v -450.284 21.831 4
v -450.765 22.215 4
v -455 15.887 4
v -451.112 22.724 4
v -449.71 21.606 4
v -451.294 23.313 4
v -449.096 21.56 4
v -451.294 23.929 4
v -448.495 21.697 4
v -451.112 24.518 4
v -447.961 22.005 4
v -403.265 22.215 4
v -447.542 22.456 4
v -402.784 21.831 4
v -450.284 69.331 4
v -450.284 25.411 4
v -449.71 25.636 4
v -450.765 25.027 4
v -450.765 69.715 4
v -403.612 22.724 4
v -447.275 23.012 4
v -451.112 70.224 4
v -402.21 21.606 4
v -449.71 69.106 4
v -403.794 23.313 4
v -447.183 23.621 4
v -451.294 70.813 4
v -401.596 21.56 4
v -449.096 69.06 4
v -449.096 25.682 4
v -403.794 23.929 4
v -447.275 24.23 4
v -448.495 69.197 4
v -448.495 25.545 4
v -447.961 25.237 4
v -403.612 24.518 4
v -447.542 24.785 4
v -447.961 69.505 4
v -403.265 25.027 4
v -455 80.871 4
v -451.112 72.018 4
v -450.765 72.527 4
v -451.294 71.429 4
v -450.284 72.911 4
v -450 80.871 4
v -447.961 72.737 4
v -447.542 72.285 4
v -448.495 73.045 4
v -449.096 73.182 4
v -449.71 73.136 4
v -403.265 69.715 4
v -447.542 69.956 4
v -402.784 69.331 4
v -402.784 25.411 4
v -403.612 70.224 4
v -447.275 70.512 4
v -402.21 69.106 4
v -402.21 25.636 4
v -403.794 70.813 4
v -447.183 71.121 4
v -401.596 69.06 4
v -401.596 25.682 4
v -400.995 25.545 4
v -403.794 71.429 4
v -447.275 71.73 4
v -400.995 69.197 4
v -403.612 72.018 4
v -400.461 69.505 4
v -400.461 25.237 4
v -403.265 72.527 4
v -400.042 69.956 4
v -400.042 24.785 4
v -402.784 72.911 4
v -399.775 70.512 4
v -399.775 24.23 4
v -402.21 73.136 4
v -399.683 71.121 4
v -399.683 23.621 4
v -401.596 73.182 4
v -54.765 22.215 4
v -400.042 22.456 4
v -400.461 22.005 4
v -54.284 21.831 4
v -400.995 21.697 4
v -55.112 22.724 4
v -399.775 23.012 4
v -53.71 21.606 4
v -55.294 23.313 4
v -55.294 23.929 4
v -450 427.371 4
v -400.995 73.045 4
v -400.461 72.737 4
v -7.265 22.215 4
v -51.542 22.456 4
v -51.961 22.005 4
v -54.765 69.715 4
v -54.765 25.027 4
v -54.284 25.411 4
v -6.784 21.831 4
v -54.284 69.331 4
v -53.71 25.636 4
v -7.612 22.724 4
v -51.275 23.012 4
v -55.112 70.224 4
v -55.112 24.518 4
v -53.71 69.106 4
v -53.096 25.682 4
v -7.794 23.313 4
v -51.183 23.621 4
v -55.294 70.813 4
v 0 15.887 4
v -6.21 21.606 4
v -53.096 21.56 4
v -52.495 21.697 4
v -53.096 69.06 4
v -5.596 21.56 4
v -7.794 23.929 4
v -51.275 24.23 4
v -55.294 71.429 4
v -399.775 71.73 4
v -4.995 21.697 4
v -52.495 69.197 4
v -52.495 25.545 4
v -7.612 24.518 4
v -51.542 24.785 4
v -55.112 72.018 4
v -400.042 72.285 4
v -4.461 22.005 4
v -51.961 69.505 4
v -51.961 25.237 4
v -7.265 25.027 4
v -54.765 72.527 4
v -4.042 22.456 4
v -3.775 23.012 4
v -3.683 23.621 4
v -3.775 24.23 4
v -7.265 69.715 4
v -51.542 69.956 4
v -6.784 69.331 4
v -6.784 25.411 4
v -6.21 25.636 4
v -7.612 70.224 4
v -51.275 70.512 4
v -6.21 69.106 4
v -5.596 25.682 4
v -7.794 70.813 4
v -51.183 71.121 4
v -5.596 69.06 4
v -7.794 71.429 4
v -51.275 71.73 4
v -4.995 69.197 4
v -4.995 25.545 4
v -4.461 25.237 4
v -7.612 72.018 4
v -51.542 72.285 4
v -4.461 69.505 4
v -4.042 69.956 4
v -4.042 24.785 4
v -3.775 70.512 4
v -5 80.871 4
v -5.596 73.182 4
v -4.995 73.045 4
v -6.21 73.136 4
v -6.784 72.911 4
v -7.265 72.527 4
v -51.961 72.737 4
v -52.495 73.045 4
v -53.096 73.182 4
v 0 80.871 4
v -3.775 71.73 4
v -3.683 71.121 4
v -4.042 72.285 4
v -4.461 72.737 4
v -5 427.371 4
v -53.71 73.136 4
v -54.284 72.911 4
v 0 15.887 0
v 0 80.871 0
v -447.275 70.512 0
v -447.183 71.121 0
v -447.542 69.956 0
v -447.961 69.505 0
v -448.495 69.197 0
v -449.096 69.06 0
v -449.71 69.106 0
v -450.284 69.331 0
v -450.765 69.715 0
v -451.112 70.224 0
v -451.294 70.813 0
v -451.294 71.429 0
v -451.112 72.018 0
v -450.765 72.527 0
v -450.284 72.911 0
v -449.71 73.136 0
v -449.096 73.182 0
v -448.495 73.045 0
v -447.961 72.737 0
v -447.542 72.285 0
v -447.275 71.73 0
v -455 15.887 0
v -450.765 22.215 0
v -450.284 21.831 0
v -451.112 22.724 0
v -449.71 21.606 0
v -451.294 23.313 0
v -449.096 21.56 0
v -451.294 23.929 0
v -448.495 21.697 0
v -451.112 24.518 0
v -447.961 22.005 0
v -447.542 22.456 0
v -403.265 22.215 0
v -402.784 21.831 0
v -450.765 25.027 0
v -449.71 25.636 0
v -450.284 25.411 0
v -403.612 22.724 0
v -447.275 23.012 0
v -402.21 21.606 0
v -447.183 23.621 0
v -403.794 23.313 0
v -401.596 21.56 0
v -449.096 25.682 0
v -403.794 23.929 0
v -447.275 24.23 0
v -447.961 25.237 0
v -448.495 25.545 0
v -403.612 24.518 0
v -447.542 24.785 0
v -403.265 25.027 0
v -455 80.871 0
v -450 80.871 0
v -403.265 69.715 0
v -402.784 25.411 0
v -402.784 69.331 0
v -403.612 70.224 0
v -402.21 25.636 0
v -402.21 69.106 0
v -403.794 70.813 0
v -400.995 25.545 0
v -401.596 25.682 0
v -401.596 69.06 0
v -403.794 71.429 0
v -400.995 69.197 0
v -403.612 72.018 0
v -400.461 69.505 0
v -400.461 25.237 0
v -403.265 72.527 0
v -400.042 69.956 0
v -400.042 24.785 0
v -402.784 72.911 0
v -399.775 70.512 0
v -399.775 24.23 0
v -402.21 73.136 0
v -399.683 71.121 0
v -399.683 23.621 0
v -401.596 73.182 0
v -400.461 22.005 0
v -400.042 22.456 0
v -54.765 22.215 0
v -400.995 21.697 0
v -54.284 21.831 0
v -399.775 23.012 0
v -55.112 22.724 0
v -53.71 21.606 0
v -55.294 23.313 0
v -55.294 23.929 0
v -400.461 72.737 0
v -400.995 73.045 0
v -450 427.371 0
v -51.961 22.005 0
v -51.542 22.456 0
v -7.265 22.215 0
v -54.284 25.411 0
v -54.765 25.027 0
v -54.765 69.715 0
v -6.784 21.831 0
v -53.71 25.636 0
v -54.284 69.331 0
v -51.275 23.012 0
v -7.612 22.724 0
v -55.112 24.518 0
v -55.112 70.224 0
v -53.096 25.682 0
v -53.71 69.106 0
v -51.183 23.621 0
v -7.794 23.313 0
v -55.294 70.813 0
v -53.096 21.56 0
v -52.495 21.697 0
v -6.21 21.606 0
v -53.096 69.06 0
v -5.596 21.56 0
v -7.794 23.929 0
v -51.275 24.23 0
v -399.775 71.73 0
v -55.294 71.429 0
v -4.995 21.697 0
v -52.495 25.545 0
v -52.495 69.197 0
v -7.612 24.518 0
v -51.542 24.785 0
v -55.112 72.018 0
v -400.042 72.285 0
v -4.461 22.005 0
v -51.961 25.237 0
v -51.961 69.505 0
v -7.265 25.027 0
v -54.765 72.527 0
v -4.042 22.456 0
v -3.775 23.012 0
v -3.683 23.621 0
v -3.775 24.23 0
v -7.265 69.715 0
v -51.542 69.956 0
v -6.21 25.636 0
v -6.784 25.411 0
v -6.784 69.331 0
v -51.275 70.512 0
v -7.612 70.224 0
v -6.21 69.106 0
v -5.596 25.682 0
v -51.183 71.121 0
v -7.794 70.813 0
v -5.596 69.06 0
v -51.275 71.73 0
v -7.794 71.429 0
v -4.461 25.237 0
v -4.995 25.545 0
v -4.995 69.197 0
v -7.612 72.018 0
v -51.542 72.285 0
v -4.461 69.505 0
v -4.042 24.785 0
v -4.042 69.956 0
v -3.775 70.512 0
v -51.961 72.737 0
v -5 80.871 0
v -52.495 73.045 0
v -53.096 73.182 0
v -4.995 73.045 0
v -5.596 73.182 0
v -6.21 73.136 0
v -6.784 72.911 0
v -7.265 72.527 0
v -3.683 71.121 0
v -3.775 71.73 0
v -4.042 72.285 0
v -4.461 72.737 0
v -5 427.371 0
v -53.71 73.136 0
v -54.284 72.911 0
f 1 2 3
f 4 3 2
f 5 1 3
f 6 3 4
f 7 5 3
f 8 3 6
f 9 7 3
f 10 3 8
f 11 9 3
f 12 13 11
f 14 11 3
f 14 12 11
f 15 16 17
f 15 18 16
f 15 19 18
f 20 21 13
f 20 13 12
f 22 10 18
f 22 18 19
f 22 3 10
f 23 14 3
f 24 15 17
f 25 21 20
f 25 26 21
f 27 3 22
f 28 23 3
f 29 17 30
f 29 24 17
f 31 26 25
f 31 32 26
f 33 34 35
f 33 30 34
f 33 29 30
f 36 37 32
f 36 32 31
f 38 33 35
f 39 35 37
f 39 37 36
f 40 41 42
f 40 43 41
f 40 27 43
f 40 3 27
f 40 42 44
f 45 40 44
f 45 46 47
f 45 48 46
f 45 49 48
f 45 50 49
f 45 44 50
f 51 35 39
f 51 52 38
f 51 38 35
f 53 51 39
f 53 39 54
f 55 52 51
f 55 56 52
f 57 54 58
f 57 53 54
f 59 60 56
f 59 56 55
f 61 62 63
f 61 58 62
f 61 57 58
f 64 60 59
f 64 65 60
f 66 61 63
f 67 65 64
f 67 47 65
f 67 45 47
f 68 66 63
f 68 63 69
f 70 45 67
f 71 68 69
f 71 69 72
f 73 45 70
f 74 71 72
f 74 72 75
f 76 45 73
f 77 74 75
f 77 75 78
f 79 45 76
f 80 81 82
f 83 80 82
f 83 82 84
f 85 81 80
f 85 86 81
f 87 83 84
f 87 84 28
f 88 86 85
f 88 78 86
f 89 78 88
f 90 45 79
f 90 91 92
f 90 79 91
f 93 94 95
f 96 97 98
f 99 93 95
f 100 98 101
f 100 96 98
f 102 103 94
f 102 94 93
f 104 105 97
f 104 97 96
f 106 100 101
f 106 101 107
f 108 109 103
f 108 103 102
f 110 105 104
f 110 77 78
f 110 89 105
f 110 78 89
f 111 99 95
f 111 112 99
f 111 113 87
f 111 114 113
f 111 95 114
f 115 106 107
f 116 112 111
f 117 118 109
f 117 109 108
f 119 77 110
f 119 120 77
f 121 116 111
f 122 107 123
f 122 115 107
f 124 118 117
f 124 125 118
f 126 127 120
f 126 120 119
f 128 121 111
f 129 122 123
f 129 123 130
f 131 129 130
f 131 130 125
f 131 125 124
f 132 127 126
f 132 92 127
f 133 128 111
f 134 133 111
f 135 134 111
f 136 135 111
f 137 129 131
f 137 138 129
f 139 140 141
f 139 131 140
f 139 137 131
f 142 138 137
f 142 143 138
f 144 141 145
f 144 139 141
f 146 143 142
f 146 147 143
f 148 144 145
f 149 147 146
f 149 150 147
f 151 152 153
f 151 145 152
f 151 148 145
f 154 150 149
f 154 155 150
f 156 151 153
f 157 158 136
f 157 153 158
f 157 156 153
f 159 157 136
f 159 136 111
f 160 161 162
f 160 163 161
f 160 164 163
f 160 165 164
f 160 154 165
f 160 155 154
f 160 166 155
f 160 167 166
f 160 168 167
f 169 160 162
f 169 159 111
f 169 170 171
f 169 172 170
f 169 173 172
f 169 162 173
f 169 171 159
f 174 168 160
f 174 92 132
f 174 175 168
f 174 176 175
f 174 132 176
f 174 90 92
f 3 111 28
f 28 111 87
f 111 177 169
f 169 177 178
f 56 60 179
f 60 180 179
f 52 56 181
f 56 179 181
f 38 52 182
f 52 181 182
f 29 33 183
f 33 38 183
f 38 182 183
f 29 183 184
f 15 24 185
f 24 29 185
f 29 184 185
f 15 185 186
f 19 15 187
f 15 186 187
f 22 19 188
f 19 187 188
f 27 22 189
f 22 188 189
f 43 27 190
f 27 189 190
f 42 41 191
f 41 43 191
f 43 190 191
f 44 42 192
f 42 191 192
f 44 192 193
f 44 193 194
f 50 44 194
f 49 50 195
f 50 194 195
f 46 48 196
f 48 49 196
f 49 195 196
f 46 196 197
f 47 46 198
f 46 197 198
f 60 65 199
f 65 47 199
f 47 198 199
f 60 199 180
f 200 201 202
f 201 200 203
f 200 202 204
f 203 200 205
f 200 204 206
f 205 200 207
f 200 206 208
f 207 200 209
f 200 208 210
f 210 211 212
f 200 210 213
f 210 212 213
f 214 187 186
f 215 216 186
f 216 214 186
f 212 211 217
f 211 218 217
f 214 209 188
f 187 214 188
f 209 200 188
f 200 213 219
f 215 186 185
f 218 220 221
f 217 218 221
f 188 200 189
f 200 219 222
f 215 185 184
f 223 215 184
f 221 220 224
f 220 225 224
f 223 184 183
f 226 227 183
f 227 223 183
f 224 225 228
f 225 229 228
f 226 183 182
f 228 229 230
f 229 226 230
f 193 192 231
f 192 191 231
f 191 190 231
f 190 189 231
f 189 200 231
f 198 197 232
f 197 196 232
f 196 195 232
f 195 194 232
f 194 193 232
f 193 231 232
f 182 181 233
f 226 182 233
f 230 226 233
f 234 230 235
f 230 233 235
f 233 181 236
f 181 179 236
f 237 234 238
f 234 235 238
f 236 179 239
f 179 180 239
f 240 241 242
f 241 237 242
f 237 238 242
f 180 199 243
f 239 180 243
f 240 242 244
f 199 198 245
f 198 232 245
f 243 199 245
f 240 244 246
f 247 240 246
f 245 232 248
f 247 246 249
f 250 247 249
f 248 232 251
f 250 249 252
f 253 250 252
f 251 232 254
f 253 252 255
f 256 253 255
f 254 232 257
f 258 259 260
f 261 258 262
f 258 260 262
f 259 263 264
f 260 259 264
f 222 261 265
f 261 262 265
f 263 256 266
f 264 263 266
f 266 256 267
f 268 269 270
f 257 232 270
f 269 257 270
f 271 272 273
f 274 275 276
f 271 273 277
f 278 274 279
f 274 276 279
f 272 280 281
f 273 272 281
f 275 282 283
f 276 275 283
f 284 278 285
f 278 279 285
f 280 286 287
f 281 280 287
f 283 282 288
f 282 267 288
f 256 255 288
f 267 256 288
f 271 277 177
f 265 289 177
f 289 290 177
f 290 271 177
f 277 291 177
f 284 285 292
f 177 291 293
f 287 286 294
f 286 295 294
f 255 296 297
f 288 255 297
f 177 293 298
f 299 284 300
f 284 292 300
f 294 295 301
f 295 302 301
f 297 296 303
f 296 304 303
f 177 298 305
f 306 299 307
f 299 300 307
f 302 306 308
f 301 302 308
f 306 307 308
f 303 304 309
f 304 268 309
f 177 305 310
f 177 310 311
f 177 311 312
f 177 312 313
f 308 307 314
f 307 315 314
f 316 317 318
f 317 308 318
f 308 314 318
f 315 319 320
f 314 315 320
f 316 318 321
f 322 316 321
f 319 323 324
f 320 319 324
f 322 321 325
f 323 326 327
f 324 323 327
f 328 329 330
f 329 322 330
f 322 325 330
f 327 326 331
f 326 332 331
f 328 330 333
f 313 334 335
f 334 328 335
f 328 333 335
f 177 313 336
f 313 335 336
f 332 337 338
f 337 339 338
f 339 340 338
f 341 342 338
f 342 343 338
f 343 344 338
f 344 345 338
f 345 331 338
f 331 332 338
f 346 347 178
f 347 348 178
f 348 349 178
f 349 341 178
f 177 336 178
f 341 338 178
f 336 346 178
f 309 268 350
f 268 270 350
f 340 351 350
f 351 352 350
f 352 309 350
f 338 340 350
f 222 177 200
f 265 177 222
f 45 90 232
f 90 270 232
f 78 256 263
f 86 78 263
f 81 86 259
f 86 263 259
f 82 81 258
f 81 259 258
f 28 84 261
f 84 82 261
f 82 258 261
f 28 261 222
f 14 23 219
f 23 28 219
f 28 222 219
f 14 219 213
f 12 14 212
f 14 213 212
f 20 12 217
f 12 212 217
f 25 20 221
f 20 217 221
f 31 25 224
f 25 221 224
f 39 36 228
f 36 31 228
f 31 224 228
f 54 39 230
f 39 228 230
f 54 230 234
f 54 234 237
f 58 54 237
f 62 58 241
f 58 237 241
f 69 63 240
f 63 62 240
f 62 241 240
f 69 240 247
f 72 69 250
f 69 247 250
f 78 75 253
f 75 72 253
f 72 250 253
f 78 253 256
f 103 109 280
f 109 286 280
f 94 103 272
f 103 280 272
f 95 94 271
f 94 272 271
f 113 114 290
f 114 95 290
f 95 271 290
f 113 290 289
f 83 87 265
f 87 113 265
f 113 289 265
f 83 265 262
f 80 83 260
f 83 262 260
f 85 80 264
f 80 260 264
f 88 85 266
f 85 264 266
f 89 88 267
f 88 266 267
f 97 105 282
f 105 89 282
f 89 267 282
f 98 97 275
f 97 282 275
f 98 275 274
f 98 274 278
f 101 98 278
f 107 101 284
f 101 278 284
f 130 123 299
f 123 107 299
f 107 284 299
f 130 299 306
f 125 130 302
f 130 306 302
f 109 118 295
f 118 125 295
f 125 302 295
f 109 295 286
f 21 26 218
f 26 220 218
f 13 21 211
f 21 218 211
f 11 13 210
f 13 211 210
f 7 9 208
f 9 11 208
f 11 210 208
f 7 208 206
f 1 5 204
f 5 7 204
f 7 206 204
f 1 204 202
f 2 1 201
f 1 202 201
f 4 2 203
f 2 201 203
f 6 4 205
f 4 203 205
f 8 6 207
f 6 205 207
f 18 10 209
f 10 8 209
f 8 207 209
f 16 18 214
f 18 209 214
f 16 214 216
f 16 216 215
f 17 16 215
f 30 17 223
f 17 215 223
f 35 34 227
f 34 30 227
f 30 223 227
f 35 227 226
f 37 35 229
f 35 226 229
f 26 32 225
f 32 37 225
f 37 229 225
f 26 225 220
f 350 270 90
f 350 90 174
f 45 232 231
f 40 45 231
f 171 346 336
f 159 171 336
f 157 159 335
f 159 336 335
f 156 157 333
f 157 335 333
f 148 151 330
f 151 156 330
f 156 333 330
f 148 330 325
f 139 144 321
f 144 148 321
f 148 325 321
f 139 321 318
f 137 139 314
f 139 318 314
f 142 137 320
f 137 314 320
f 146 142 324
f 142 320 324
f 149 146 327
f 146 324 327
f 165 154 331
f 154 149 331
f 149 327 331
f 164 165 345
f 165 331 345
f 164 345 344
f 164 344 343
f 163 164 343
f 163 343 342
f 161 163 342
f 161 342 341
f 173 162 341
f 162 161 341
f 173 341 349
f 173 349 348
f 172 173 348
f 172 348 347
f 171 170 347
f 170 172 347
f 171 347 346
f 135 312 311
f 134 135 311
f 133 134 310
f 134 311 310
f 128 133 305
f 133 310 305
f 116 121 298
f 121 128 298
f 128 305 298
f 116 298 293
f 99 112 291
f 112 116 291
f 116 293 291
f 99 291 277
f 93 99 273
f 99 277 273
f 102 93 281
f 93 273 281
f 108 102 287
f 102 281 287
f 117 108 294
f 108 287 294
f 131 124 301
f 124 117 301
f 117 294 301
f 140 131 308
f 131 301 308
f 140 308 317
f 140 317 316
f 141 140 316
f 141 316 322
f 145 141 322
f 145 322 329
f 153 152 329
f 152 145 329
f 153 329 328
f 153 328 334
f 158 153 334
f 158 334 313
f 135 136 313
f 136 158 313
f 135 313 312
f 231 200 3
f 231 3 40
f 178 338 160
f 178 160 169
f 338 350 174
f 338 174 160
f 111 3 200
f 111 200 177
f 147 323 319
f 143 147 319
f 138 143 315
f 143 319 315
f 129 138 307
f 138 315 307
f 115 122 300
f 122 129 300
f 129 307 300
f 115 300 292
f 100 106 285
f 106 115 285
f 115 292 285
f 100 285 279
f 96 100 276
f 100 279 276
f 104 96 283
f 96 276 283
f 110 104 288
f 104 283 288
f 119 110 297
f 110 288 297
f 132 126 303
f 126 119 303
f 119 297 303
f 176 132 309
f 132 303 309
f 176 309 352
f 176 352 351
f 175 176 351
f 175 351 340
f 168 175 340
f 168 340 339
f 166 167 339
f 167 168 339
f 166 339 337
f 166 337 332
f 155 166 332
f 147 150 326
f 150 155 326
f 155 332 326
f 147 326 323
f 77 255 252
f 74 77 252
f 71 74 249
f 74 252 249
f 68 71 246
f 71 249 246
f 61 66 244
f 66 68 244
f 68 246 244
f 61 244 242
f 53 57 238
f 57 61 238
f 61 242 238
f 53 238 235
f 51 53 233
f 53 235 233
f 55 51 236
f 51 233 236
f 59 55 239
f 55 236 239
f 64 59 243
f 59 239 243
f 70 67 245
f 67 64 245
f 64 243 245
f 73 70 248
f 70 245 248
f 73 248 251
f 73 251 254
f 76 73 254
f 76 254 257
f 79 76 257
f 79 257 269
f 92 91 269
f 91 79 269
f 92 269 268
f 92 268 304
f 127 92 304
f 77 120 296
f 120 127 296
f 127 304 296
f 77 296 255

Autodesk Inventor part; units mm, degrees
ref_plane "YZ Plane" through (0, 0, 0) normal (1, 0, 0) x (0, 1, 0)
ref_plane "XZ Plane" through (0, 0, 0) normal (0, 1, 0) x (-1, 0, 0)
ref_plane "XY Plane" through (0, 0, 0) normal (0, 0, 1) x (1, 0, 0)
ref_plane "Work Plane1" through (0, 10, 0) normal (0, 0, 1) x (1, 0, 0)
sketch "Sketch1" plane through (0, 10, 0) normal (0, 0, 1) x (1, 0, 0)
  line L0 (-1, 70.8708) -> (-1, -7.0974) projected
  line L1 (-1, 70.8708) -> (-53.0809, 70.8708) projected
  arc A0 (-53.0809, 70.8708) -> (-59.8755, 68.2079) centre (-53.0809, 60.8708) ccw projected
  line L2 (-59.8755, 68.2079) -> (-118.9152, 13.5337) projected
  line L3 (-1, -7.0974) -> (-454, -7.0974) projected
  circle A1 centre (-53.25, 13.6208) radius 2.067 projected
  circle A2 centre (-53.25, 61.1208) radius 2.067 projected
  circle A3 centre (-5.75, 13.6208) radius 2.067 projected
  circle A4 centre (-5.75, 61.1208) radius 2.067 projected
  circle A5 centre (-401.75, 61.1208) radius 2.067 projected
  circle A6 centre (-449.25, 61.1208) radius 2.067 projected
  circle A7 centre (-401.75, 13.6208) radius 2.067 projected
  circle A8 centre (-449.25, 13.6208) radius 2.067 projected
  line L4 (-454, -7.0974) -> (-454, 70.8708) projected
  line L5 (-1, -7.0974) -> (-454, -7.0974) projected
  arc A9 (-344.754, 14.034) -> (-337.4562, 10.8708) centre (-337.4562, 20.8708) ccw projected
  line L6 (-344.754, 14.034) -> (-395.0366, 67.7076) projected
  arc A10 (-395.0366, 67.7076) -> (-402.3345, 70.8708) centre (-402.3345, 60.8708) ccw projected
  line L7 (-402.3345, 70.8708) -> (-454, 70.8708) projected
  arc A11 (-436.1083, -78.4697) -> (-447.5, -37.6782) centre (-447.5, -59.6646) ccw projected
  line L8 (-18.8917, -78.4697) -> (-436.1083, -78.4697) projected
  arc A12 (-7.5, -37.6782) -> (-18.8917, -78.4697) centre (-7.5, -59.6646) ccw projected
  line L9 (-2, -37.6782) -> (-7.5, -37.6782) projected
  arc A13 (-2, -37.6782) -> (-1, -36.6782) centre (-2, -36.6782) ccw projected
  line L10 (-1, -12.4515) -> (-1, -36.6782) projected
  line L11 (-454, -12.4515) -> (-1, -12.4515) projected
  line L12 (-454, -36.6782) -> (-454, -12.4515) projected
  arc A14 (-454, -36.6782) -> (-453, -37.6782) centre (-453, -36.6782) ccw projected
  line L13 (-447.5, -37.6782) -> (-453, -37.6782) projected
  line L14 (-237.5, -48.429) -> (-237.5, -34.9155) projected
  ellipse E0 centre (-235.5, -34.9155) end of major axis (-237.5, -34.9155) minor radius 1.6892 (-235.5, -33.2263) -> (-237.5, -34.9155) ccw projected
  line L15 (-235.5, -33.2263) -> (-219.5, -33.2263) projected
  ellipse E1 centre (-219.5, -34.9155) end of major axis (-221.5, -34.9155) minor radius 1.6892 (-217.5, -34.9155) -> (-219.5, -33.2263) ccw projected
  line L16 (-217.5, -34.9155) -> (-217.5, -48.429) projected
  ellipse E2 centre (-219.5, -48.429) end of major axis (-217.5, -48.429) minor radius 1.6892 (-219.5, -50.1182) -> (-217.5, -48.429) ccw projected
  line L17 (-219.5, -50.1182) -> (-235.5, -50.1182) projected
  ellipse E3 centre (-235.5, -48.429) end of major axis (-233.5, -48.429) minor radius 1.6892 (-237.5, -48.429) -> (-235.5, -50.1182) ccw projected
  line L18 (-267.5, -48.429) -> (-267.5, -34.9155) projected
  ellipse E4 centre (-265.5, -34.9155) end of major axis (-267.5, -34.9155) minor radius 1.6892 (-265.5, -33.2263) -> (-267.5, -34.9155) ccw projected
  line L19 (-265.5, -33.2263) -> (-249.5, -33.2263) projected
  ellipse E5 centre (-249.5, -34.9155) end of major axis (-251.5, -34.9155) minor radius 1.6892 (-247.5, -34.9155) -> (-249.5, -33.2263) ccw projected
  line L20 (-247.5, -34.9155) -> (-247.5, -48.429) projected
  ellipse E6 centre (-249.5, -48.429) end of major axis (-247.5, -48.429) minor radius 1.6892 (-249.5, -50.1182) -> (-247.5, -48.429) ccw projected
  line L21 (-249.5, -50.1182) -> (-265.5, -50.1182) projected
  ellipse E7 centre (-265.5, -48.429) end of major axis (-263.5, -48.429) minor radius 1.6892 (-267.5, -48.429) -> (-265.5, -50.1182) ccw projected
  line L22 (-205.5, -33.2263) -> (-189.5, -33.2263) projected
  ellipse E8 centre (-189.5, -34.9155) end of major axis (-191.5, -34.9155) minor radius 1.6892 (-187.5, -34.9155) -> (-189.5, -33.2263) ccw projected
  line L23 (-187.5, -34.9155) -> (-187.5, -48.429) projected
  ellipse E9 centre (-189.5, -48.429) end of major axis (-187.5, -48.429) minor radius 1.6892 (-189.5, -50.1182) -> (-187.5, -48.429) ccw projected
  line L24 (-189.5, -50.1182) -> (-205.5, -50.1182) projected
  ellipse E10 centre (-205.5, -48.429) end of major axis (-203.5, -48.429) minor radius 1.6892 (-207.5, -48.429) -> (-205.5, -50.1182) ccw projected
  line L25 (-207.5, -48.429) -> (-207.5, -34.9155) projected
  ellipse E11 centre (-205.5, -34.9155) end of major axis (-207.5, -34.9155) minor radius 1.6892 (-205.5, -33.2263) -> (-207.5, -34.9155) ccw projected
  line L26 (-395, -52.2297) -> (-395, -31.1148) projected
  ellipse E12 centre (-385, -31.1148) end of major axis (-395, -31.1148) minor radius 8.4459 (-385, -22.6689) -> (-395, -31.1148) ccw projected
  line L27 (-385, -22.6689) -> (-310, -22.6689) projected
  ellipse E13 centre (-310, -31.1148) end of major axis (-320, -31.1148) minor radius 8.4459 (-300, -31.1148) -> (-310, -22.6689) ccw projected
  line L28 (-300, -31.1148) -> (-300, -52.2297) projected
  ellipse E14 centre (-310, -52.2297) end of major axis (-300, -52.2297) minor radius 8.4459 (-310, -60.6756) -> (-300, -52.2297) ccw projected
  line L29 (-310, -60.6756) -> (-385, -60.6756) projected
  ellipse E15 centre (-385, -52.2297) end of major axis (-375, -52.2297) minor radius 8.4459 (-395, -52.2297) -> (-385, -60.6756) ccw projected
  line L30 (-145, -22.6689) -> (-70, -22.6689) projected
  ellipse E16 centre (-70, -31.1148) end of major axis (-80, -31.1148) minor radius 8.4459 (-60, -31.1148) -> (-70, -22.6689) ccw projected
  line L31 (-60, -31.1148) -> (-60, -52.2297) projected
  ellipse E17 centre (-70, -52.2297) end of major axis (-60, -52.2297) minor radius 8.4459 (-70, -60.6756) -> (-60, -52.2297) ccw projected
  line L32 (-70, -60.6756) -> (-145, -60.6756) projected
  ellipse E18 centre (-145, -52.2297) end of major axis (-135, -52.2297) minor radius 8.4459 (-155, -52.2297) -> (-145, -60.6756) ccw projected
  line L33 (-155, -52.2297) -> (-155, -31.1148) projected
  ellipse E19 centre (-145, -31.1148) end of major axis (-155, -31.1148) minor radius 8.4459 (-145, -22.6689) -> (-155, -31.1148) ccw projected
  circle A15 centre (-53.25, 13.6208) radius 2.067 projected
  circle A16 centre (-53.25, 61.1208) radius 2.067 projected
  circle A17 centre (-5.75, 13.6208) radius 2.067 projected
  circle A18 centre (-5.75, 61.1208) radius 2.067 projected
  line L34 (-1, 70.8708) -> (-1, -7.0974) projected
  line L35 (-1, 70.8708) -> (-53.0809, 70.8708) projected
  arc A19 (-53.0809, 70.8708) -> (-59.8755, 68.2079) centre (-53.0809, 60.8708) ccw projected
  line L36 (-59.8755, 68.2079) -> (-118.9152, 13.5337) projected
  arc A20 (-125.7098, 10.8708) -> (-118.9152, 13.5337) centre (-125.7098, 20.8708) ccw projected
  line L37 (-125.7098, 10.8708) -> (-337.4562, 10.8708) projected
  circle A21 centre (-449.25, 13.6208) radius 2.067 projected
  circle A22 centre (-401.75, 13.6208) radius 2.067 projected
  circle A23 centre (-449.25, 61.1208) radius 2.067 projected
  circle A24 centre (-401.75, 61.1208) radius 2.067 projected
  line L38 (-454, -7.0974) -> (-454, 70.8708) projected
  arc A25 (-125.7098, 10.8708) -> (-118.9152, 13.5337) centre (-125.7098, 20.8708) ccw projected
  line L39 (-125.7098, 10.8708) -> (-337.4562, 10.8708) projected
  arc A26 (-344.754, 14.034) -> (-337.4562, 10.8708) centre (-337.4562, 20.8708) ccw projected
  line L40 (-344.754, 14.034) -> (-395.0366, 67.7076) projected
  arc A27 (-395.0366, 67.7076) -> (-402.3345, 70.8708) centre (-402.3345, 60.8708) ccw projected
  line L41 (-402.3345, 70.8708) -> (-454, 70.8708) projected
  circle A28 centre (-227.5, 1.8867) radius 4
  line L42 (-227.5, 1.8867) -> (-227.5, -7.0974) construction
  line L43 (-227.5, 1.8867) -> (-227.5, 10.8708) construction
  line L44 (51.5, 217.3708) -> (43.5, 217.3708)
  line L45 (-506.5, 217.3708) -> (-498.5, 217.3708)
  line L46 (-1, -7.0974) -> (-454, -7.0974)
  line L47 (-455, 417.3708) -> (0, 417.3708)
  line L48 (-455, 70.8708) -> (-455, 6.8872) projected
  line L49 (0, -7.0974) -> (0, 70.8708) projected
  line L50 (-455, -7.0974) -> (-455, 417.3708)
  line L51 (0, -7.0974) -> (0, 417.3708)
  line L52 (-1, -7.0974) -> (0, -7.0974)
  line L53 (-454, -7.0974) -> (-455, -7.0974)
  point P0 (0, -10)
  point P1 (-227.5, -33.2263)
  point P2 (0, 70.8708)
  point P3 (-455, 6.8872)
  point P4 (-454, -7.0974)
  dimension "d0" = 8
  dimension "d1" = 200
extrude "Extrusion1" add sketch "Sketch1" along normal blind 4 contours L1 A0 L2 A20 L37 A9 L6 A10 L7 L4 L53 L50 L48 L47 L51 L49 L52 L0 | L0 L3 L4 L7 A10 L6 A9 L37 A20 L2 A0 L1
sketch "Sketch2" plane through (0, 10, 4) normal (0, 0, 1) x (1, 0, 0)
  line L0 (0, -7.0974) -> (0, 417.3708) projected
  line L1 (0, 417.3708) -> (-455, 417.3708) projected
  line L2 (-455, 417.3708) -> (-455, -7.0974) projected
  line L3 (-455, -7.0974) -> (0, -7.0974) projected
  circle A0 centre (-227.5, 1.8867) radius 4 projected
  circle A1 centre (-449.25, 13.6208) radius 2.067 projected
  circle A2 centre (-53.25, 13.6208) radius 2.067 projected
  circle A3 centre (-53.25, 61.1208) radius 2.067 projected
  circle A4 centre (-5.75, 13.6208) radius 2.067 projected
  circle A5 centre (-5.75, 61.1208) radius 2.067 projected
  circle A6 centre (-401.75, 61.1208) radius 2.067 projected
  circle A7 centre (-449.25, 61.1208) radius 2.067 projected
  circle A8 centre (-401.75, 13.6208) radius 2.067 projected
  line L4 (-455, 417.3708) -> (-455, -7.0974) projected
  line L5 (0, -7.0974) -> (-455, -7.0974)
  line L6 (-455, -7.0974) -> (-455, 5.8867)
  line L7 (-455, 5.8867) -> (0, 5.8867)
  line L8 (0, 5.8867) -> (0, -7.0974)
  point P0 (0, -10)
extrude "Cut1" cut sketch "Sketch2" against normal up to next contours L3 L2 L7 L0
sketch "Sketch3" plane through (0, 10, 0) normal (0, 0, -1) x (-1, 0, 0)
  circle A0 centre (401.75, 13.6208) radius 2.067 projected
  circle A1 centre (449.25, 61.1208) radius 2.067 projected
  circle A2 centre (401.75, 61.1208) radius 2.067 projected
  circle A3 centre (5.75, 61.1208) radius 2.067 projected
  circle A4 centre (5.75, 13.6208) radius 2.067 projected
  circle A5 centre (53.25, 61.1208) radius 2.067 projected
  circle A6 centre (53.25, 13.6208) radius 2.067 projected
  circle A7 centre (449.25, 13.6208) radius 2.067 projected
  line L0 (0, 5.8867) -> (455, 5.8867) projected
  line L1 (455, 417.3708) -> (455, 5.8867) projected
  line L2 (0, 417.3708) -> (455, 417.3708) projected
  line L3 (0, 5.8867) -> (0, 417.3708) projected
  line L4 (455, 417.3708) -> (450, 417.3708)
  line L5 (450, 417.3708) -> (450, 70.8708)
  line L6 (450, 70.8708) -> (455, 70.8708)
  line L7 (455, 70.8708) -> (455, 417.3708)
  line L8 (0, 417.3708) -> (5, 417.3708)
  line L9 (5, 417.3708) -> (5, 70.8708)
  line L10 (5, 70.8708) -> (0, 70.8708)
  line L11 (0, 70.8708) -> (0, 417.3708)
  point P0 (0, -10)
  dimension "d7" = 5
  dimension "d8" = 346.5
extrude "Cut2" cut sketch "Sketch3" against normal through all contours L3 L2 L9 L10 | L6 L5 L2 L1
equation "\"d5\" = Thickness"
equation "\"d9\" = Thickness"
equation "\"BendRadius\" = Thickness"
equation "\"BendReliefWidth\" = Thickness"
equation "\"BendReliefDepth\" = 0.5 * Thickness"
equation "\"CornerReliefSize\" = 4 * Thickness"
equation "\"MinimumRemnant\" = 2 * Thickness"
equation "\"TransitionRadius\" = BendRadius"
equation "\"JacobiRadiusSize\" = Thickness"
equation "\"GapSize\" = Thickness"
equation "\"d4\" = Thickness"
equation "\"Thickness\" = 0.5"
properties part number "voetensteun"
